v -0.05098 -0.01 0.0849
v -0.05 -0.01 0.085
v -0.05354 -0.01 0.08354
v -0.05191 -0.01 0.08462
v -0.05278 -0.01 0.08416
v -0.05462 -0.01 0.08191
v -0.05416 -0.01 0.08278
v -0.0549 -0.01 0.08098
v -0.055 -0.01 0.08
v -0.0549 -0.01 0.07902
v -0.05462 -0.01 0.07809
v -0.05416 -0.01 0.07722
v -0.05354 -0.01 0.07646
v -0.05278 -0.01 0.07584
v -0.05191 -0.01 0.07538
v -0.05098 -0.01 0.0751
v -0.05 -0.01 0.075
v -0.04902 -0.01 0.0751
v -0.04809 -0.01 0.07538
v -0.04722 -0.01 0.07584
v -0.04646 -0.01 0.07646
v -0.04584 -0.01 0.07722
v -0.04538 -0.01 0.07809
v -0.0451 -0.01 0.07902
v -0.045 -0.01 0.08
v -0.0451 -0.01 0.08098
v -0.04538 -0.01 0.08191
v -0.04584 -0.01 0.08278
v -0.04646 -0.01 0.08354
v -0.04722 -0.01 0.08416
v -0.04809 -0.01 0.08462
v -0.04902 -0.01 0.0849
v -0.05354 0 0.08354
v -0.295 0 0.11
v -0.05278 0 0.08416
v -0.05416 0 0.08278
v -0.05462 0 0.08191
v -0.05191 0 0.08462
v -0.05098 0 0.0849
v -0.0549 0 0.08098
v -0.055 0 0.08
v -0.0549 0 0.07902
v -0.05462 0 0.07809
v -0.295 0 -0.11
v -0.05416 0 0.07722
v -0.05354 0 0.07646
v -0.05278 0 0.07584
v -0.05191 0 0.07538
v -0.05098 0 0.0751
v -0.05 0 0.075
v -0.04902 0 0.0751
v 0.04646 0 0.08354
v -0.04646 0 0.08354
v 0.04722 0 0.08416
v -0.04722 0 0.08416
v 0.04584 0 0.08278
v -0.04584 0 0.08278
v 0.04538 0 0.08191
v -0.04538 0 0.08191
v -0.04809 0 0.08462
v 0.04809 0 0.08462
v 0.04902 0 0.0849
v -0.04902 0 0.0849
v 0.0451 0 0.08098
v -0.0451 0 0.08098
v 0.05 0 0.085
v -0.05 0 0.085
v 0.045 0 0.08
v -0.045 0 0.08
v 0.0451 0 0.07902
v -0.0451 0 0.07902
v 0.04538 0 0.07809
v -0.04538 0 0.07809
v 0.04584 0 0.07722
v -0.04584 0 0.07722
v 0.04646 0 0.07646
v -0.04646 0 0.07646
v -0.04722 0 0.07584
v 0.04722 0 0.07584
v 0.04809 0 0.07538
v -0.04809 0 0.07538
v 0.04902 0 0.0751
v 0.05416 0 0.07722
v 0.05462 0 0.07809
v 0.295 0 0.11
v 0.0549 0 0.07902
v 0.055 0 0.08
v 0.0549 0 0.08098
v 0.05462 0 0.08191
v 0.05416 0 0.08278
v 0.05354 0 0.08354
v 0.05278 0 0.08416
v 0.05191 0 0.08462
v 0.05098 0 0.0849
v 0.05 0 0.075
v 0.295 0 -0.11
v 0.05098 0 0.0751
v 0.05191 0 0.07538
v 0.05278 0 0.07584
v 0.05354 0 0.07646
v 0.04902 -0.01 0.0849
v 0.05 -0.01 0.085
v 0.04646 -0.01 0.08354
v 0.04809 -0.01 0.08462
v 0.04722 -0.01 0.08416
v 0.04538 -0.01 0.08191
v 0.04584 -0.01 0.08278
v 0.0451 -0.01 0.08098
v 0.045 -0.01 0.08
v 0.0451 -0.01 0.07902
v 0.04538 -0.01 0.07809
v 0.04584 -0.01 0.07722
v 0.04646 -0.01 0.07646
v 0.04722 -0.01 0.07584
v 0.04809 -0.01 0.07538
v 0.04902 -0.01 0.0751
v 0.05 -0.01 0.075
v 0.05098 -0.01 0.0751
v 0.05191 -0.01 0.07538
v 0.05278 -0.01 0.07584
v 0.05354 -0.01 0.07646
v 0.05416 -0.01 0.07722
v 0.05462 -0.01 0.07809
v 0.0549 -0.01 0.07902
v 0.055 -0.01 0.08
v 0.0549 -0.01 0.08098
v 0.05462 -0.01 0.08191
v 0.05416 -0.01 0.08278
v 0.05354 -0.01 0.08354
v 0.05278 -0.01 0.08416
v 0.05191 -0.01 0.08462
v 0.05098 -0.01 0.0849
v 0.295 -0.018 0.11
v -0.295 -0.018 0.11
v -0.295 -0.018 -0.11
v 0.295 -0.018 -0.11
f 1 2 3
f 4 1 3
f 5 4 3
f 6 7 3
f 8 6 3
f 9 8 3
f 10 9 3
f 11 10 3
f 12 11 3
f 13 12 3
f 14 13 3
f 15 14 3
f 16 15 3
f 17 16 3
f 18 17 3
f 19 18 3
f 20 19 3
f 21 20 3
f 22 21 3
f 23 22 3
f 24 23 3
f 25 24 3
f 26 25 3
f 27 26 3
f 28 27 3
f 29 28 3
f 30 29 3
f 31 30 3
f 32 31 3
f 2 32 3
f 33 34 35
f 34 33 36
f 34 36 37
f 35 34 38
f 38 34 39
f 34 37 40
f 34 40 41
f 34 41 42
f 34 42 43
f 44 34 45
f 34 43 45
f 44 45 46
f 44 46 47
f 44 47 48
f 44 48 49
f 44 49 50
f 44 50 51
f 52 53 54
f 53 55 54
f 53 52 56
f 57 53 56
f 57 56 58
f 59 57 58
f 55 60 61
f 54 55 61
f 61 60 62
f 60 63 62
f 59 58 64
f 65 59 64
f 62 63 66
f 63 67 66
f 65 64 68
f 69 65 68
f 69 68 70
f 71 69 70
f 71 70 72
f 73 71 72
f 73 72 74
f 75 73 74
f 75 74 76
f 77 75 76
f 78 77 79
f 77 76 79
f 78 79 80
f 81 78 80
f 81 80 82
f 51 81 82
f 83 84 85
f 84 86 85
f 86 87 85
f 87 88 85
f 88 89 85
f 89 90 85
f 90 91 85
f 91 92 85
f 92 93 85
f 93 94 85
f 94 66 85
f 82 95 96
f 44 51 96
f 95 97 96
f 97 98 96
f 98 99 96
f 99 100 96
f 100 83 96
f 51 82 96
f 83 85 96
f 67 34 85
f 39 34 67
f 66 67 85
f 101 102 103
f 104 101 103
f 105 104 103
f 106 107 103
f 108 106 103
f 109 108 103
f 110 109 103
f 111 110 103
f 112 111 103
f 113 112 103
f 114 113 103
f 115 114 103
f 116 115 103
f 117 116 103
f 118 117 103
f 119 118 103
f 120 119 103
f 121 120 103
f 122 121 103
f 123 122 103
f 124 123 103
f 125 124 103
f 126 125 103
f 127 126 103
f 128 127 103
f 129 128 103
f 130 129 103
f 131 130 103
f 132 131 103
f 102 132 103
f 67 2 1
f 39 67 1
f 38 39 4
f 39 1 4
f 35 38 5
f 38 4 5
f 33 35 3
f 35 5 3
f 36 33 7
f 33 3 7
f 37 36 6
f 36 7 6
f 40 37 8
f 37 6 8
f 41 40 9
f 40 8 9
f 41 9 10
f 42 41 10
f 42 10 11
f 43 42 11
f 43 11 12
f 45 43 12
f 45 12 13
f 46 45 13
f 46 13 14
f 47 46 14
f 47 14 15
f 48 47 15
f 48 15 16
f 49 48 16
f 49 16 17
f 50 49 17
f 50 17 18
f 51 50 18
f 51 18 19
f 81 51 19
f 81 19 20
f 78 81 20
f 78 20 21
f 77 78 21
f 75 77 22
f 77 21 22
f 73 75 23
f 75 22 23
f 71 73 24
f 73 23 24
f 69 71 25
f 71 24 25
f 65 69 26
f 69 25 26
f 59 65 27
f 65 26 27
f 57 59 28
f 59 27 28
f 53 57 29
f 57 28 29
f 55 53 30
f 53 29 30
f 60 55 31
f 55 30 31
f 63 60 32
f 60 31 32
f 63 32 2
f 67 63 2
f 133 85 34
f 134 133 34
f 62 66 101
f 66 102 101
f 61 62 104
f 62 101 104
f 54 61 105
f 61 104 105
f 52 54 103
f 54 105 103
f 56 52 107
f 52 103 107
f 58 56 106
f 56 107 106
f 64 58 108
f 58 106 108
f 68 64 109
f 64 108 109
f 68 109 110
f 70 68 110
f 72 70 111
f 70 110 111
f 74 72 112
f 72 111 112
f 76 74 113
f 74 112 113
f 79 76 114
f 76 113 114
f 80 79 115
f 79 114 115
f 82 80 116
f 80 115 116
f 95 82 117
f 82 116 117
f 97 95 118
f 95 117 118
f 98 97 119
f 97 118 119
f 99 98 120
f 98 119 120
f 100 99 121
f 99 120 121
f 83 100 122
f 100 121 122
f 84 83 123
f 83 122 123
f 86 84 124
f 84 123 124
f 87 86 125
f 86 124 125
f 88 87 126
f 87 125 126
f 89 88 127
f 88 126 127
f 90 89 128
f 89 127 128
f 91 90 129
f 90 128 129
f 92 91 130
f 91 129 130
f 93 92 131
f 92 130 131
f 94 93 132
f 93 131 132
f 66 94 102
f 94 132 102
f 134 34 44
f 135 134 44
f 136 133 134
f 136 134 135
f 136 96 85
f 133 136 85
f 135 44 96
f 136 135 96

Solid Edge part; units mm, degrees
sketch "Sketch1" plane through (0, 0, 0) normal (0, -1, 0) x (1, 0, 0)
  line L0 (-0.295, -0.11) -> (0.295, -0.11)
  line L1 (0.295, -0.11) -> (0.295, 0.11)
  line L2 (0.295, 0.11) -> (-0.295, 0.11)
  line L3 (-0.295, 0.11) -> (-0.295, -0.11)
  dimension "D1" = 0.22
  dimension "D2" = 0.59
extrude "Protrusion1" add sketch "Sketch1" along normal blind 0.018
hole "Bohrung_1" at (-0.05, 0, 0.08) direction (0, -1, 0) diameter 0.01 depth 0.01
hole "Hole1" at (0.05, 0, 0.08) direction (0, -1, 0) diameter 0.01 depth 0.01
